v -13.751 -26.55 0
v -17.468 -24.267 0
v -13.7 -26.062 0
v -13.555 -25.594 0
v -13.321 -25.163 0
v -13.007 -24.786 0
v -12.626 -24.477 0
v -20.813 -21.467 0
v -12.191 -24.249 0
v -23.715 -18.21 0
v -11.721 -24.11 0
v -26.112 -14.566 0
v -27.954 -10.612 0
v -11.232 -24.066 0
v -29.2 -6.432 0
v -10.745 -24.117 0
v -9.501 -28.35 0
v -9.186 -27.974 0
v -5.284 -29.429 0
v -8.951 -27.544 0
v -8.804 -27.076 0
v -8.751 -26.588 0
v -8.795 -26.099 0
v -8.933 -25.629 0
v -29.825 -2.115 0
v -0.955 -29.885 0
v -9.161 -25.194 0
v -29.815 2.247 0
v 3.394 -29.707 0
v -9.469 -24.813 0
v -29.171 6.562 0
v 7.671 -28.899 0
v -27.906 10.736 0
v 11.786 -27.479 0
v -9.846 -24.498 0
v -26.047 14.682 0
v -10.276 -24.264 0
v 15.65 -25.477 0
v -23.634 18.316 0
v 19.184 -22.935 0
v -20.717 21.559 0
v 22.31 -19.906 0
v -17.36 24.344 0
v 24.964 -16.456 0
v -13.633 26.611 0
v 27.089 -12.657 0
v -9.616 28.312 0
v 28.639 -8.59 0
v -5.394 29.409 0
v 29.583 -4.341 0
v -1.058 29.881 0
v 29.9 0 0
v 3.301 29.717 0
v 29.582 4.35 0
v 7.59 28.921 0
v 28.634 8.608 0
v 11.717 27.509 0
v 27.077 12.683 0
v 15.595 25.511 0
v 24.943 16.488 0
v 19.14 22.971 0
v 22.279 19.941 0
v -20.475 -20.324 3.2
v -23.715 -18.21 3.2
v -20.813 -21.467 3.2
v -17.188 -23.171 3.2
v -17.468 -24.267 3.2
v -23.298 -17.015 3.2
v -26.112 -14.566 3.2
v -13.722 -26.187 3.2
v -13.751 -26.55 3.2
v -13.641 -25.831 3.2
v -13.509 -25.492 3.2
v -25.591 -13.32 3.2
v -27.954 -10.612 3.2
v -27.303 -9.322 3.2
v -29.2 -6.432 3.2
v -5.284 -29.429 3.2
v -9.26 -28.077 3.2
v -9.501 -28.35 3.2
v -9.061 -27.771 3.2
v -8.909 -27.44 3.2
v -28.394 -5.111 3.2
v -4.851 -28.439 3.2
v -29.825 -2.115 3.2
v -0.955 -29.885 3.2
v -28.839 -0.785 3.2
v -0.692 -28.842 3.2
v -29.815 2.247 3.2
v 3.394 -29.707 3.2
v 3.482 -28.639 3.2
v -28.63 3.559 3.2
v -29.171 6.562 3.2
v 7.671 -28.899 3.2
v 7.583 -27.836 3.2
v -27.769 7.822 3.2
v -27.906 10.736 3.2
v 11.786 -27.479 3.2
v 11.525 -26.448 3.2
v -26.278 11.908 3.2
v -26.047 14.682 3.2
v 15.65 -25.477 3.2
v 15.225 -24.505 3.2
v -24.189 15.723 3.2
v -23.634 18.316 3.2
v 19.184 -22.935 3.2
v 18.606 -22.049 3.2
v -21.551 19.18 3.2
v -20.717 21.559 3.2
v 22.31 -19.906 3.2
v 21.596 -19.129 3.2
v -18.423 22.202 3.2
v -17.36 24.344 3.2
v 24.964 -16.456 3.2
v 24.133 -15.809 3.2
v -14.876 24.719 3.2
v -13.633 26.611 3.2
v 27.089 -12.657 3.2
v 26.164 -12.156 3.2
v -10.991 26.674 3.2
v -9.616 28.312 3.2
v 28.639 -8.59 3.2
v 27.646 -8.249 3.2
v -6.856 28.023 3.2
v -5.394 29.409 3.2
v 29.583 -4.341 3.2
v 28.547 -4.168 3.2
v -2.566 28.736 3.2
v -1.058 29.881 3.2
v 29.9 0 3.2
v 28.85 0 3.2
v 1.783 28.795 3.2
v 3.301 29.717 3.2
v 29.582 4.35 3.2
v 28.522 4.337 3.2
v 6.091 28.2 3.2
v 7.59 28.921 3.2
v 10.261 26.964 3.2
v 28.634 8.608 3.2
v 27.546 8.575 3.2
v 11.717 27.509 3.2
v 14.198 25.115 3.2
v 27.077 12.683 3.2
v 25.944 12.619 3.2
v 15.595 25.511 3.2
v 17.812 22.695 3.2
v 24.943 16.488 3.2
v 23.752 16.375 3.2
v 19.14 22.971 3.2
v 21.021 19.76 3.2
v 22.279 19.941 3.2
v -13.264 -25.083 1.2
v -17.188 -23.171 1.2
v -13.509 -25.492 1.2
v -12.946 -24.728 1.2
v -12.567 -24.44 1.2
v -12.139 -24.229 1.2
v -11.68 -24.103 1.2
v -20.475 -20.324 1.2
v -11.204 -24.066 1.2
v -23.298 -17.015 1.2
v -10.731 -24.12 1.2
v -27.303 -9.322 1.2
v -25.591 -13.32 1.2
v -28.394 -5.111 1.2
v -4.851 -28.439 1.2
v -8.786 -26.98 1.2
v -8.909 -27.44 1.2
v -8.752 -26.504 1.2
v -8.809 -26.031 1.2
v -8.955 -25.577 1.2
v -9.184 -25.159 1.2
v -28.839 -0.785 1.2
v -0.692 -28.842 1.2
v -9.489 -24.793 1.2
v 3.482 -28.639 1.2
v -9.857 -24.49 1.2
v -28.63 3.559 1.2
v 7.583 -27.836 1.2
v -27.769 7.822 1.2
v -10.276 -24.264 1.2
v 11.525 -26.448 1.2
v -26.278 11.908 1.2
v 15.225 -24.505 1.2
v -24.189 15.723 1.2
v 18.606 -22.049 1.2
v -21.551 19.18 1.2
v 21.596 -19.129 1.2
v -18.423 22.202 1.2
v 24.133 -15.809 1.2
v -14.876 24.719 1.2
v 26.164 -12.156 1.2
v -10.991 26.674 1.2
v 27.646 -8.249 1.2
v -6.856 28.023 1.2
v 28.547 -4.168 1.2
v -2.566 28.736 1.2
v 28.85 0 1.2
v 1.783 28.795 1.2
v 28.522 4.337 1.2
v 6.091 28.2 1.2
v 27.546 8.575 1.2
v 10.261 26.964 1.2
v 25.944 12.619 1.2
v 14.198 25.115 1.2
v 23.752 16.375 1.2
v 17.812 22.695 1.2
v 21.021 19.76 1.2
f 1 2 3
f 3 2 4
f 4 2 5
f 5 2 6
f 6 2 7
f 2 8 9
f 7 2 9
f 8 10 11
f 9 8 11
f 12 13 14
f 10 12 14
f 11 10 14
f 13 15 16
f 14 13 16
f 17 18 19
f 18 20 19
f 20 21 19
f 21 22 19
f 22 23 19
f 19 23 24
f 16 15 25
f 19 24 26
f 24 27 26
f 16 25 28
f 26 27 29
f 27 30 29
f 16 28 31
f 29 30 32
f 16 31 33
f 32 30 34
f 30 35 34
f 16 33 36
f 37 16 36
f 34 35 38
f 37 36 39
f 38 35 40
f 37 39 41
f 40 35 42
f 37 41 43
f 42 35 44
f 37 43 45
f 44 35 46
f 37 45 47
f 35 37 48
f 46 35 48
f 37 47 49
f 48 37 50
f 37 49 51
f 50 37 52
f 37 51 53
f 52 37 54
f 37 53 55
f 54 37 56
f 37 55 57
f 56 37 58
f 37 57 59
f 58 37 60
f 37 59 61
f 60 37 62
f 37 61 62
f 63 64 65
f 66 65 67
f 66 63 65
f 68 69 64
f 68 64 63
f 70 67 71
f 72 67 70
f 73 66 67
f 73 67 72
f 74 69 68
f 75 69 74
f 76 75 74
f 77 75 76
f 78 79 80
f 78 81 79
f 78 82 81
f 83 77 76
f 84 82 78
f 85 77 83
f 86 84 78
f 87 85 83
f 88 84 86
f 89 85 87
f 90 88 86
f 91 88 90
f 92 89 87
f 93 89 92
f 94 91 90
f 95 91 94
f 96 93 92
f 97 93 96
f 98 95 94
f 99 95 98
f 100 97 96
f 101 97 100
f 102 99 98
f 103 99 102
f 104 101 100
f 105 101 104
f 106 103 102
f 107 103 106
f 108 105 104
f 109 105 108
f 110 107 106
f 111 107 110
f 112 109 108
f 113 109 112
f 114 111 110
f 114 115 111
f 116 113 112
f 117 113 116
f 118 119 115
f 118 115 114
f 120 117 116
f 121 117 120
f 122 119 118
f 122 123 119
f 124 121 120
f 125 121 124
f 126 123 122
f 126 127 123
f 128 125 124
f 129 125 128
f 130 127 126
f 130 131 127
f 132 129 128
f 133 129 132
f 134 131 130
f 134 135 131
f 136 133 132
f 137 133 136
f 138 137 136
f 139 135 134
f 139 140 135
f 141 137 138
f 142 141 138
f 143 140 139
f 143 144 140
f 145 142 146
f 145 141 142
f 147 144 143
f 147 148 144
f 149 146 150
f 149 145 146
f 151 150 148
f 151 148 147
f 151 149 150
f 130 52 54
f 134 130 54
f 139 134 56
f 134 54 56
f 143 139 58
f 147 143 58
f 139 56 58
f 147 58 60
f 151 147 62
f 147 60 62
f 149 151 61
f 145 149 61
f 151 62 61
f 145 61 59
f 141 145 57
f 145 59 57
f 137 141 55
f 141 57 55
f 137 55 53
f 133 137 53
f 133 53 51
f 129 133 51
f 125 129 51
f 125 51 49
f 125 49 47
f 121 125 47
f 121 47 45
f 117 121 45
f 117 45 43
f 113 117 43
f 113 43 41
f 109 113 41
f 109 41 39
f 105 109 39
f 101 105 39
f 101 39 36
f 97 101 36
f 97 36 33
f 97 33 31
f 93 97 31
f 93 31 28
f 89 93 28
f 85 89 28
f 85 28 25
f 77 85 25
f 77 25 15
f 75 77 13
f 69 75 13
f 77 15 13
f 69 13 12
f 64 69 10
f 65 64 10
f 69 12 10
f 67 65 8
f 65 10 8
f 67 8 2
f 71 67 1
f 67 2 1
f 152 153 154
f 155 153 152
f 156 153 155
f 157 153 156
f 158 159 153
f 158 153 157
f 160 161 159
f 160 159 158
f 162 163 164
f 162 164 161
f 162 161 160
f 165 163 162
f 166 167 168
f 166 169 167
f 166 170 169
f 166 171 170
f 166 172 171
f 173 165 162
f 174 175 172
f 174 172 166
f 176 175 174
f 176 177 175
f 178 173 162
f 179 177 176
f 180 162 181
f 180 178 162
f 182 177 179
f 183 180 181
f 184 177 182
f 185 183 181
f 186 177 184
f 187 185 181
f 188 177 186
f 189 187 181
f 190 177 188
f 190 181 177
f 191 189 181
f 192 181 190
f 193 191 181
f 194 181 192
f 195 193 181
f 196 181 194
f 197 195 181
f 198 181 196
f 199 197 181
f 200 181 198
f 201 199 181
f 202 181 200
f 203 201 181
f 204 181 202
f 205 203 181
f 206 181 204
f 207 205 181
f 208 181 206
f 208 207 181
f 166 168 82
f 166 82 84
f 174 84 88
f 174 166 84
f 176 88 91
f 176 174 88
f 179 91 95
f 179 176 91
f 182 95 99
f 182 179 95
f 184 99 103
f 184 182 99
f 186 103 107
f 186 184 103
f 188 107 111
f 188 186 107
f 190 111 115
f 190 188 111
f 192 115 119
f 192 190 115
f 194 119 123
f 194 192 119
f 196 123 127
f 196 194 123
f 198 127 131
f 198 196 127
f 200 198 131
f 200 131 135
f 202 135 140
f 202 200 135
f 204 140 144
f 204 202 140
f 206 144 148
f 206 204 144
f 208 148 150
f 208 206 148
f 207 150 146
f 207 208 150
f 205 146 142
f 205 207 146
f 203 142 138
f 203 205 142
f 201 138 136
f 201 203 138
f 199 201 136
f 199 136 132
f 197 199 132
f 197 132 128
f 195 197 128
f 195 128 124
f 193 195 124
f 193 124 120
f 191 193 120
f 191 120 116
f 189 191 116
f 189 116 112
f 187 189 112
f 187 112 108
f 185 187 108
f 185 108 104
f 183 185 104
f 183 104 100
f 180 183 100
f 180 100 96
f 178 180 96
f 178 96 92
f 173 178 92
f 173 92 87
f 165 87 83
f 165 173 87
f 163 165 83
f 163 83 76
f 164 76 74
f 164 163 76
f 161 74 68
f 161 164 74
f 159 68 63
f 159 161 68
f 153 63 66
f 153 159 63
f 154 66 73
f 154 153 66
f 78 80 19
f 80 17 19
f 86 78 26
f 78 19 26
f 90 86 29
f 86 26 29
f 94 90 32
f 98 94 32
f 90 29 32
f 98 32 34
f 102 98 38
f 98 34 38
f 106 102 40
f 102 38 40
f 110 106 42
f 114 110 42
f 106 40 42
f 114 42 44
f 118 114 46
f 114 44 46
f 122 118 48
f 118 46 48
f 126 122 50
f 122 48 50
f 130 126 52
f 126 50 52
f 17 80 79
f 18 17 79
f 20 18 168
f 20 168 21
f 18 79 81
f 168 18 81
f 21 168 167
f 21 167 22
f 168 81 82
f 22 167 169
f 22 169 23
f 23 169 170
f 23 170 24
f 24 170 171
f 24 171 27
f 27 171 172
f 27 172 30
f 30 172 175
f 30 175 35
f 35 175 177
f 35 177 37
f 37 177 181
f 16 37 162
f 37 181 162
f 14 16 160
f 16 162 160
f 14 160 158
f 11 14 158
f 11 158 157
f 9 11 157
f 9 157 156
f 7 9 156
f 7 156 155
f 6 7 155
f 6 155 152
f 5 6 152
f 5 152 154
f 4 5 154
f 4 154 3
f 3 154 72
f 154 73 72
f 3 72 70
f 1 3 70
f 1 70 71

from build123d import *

# Parameters (mm, degrees)
F0_R     = 29.9
F1_DEPTH = 1.2
F2_R     = 29.9
F2_R_2   = 28.85
F3_DEPTH = 2
F4_R     = 2.5
F5_DEPTH = 3.2


with BuildPart() as f1:
    # F0 (on Top) → F1 (new body)
    with BuildSketch(Plane.XY):
        Circle(F0_R)
    extrude(amount=F1_DEPTH)

    # F2 (on face) → F3 (join)
    with BuildSketch(Plane.XY.offset(1.2)):
        Circle(F2_R)
        Circle(F2_R_2, mode=Mode.SUBTRACT)
    extrude(amount=F3_DEPTH)

    # F4 (on face) → F5 (cut)
    with BuildSketch(Plane.XY.offset(3.2)):
        with Locations((-11.251354, -26.56557)):
            Circle(F4_R)
    extrude(amount=-F5_DEPTH, mode=Mode.SUBTRACT)


solid = f1.part
